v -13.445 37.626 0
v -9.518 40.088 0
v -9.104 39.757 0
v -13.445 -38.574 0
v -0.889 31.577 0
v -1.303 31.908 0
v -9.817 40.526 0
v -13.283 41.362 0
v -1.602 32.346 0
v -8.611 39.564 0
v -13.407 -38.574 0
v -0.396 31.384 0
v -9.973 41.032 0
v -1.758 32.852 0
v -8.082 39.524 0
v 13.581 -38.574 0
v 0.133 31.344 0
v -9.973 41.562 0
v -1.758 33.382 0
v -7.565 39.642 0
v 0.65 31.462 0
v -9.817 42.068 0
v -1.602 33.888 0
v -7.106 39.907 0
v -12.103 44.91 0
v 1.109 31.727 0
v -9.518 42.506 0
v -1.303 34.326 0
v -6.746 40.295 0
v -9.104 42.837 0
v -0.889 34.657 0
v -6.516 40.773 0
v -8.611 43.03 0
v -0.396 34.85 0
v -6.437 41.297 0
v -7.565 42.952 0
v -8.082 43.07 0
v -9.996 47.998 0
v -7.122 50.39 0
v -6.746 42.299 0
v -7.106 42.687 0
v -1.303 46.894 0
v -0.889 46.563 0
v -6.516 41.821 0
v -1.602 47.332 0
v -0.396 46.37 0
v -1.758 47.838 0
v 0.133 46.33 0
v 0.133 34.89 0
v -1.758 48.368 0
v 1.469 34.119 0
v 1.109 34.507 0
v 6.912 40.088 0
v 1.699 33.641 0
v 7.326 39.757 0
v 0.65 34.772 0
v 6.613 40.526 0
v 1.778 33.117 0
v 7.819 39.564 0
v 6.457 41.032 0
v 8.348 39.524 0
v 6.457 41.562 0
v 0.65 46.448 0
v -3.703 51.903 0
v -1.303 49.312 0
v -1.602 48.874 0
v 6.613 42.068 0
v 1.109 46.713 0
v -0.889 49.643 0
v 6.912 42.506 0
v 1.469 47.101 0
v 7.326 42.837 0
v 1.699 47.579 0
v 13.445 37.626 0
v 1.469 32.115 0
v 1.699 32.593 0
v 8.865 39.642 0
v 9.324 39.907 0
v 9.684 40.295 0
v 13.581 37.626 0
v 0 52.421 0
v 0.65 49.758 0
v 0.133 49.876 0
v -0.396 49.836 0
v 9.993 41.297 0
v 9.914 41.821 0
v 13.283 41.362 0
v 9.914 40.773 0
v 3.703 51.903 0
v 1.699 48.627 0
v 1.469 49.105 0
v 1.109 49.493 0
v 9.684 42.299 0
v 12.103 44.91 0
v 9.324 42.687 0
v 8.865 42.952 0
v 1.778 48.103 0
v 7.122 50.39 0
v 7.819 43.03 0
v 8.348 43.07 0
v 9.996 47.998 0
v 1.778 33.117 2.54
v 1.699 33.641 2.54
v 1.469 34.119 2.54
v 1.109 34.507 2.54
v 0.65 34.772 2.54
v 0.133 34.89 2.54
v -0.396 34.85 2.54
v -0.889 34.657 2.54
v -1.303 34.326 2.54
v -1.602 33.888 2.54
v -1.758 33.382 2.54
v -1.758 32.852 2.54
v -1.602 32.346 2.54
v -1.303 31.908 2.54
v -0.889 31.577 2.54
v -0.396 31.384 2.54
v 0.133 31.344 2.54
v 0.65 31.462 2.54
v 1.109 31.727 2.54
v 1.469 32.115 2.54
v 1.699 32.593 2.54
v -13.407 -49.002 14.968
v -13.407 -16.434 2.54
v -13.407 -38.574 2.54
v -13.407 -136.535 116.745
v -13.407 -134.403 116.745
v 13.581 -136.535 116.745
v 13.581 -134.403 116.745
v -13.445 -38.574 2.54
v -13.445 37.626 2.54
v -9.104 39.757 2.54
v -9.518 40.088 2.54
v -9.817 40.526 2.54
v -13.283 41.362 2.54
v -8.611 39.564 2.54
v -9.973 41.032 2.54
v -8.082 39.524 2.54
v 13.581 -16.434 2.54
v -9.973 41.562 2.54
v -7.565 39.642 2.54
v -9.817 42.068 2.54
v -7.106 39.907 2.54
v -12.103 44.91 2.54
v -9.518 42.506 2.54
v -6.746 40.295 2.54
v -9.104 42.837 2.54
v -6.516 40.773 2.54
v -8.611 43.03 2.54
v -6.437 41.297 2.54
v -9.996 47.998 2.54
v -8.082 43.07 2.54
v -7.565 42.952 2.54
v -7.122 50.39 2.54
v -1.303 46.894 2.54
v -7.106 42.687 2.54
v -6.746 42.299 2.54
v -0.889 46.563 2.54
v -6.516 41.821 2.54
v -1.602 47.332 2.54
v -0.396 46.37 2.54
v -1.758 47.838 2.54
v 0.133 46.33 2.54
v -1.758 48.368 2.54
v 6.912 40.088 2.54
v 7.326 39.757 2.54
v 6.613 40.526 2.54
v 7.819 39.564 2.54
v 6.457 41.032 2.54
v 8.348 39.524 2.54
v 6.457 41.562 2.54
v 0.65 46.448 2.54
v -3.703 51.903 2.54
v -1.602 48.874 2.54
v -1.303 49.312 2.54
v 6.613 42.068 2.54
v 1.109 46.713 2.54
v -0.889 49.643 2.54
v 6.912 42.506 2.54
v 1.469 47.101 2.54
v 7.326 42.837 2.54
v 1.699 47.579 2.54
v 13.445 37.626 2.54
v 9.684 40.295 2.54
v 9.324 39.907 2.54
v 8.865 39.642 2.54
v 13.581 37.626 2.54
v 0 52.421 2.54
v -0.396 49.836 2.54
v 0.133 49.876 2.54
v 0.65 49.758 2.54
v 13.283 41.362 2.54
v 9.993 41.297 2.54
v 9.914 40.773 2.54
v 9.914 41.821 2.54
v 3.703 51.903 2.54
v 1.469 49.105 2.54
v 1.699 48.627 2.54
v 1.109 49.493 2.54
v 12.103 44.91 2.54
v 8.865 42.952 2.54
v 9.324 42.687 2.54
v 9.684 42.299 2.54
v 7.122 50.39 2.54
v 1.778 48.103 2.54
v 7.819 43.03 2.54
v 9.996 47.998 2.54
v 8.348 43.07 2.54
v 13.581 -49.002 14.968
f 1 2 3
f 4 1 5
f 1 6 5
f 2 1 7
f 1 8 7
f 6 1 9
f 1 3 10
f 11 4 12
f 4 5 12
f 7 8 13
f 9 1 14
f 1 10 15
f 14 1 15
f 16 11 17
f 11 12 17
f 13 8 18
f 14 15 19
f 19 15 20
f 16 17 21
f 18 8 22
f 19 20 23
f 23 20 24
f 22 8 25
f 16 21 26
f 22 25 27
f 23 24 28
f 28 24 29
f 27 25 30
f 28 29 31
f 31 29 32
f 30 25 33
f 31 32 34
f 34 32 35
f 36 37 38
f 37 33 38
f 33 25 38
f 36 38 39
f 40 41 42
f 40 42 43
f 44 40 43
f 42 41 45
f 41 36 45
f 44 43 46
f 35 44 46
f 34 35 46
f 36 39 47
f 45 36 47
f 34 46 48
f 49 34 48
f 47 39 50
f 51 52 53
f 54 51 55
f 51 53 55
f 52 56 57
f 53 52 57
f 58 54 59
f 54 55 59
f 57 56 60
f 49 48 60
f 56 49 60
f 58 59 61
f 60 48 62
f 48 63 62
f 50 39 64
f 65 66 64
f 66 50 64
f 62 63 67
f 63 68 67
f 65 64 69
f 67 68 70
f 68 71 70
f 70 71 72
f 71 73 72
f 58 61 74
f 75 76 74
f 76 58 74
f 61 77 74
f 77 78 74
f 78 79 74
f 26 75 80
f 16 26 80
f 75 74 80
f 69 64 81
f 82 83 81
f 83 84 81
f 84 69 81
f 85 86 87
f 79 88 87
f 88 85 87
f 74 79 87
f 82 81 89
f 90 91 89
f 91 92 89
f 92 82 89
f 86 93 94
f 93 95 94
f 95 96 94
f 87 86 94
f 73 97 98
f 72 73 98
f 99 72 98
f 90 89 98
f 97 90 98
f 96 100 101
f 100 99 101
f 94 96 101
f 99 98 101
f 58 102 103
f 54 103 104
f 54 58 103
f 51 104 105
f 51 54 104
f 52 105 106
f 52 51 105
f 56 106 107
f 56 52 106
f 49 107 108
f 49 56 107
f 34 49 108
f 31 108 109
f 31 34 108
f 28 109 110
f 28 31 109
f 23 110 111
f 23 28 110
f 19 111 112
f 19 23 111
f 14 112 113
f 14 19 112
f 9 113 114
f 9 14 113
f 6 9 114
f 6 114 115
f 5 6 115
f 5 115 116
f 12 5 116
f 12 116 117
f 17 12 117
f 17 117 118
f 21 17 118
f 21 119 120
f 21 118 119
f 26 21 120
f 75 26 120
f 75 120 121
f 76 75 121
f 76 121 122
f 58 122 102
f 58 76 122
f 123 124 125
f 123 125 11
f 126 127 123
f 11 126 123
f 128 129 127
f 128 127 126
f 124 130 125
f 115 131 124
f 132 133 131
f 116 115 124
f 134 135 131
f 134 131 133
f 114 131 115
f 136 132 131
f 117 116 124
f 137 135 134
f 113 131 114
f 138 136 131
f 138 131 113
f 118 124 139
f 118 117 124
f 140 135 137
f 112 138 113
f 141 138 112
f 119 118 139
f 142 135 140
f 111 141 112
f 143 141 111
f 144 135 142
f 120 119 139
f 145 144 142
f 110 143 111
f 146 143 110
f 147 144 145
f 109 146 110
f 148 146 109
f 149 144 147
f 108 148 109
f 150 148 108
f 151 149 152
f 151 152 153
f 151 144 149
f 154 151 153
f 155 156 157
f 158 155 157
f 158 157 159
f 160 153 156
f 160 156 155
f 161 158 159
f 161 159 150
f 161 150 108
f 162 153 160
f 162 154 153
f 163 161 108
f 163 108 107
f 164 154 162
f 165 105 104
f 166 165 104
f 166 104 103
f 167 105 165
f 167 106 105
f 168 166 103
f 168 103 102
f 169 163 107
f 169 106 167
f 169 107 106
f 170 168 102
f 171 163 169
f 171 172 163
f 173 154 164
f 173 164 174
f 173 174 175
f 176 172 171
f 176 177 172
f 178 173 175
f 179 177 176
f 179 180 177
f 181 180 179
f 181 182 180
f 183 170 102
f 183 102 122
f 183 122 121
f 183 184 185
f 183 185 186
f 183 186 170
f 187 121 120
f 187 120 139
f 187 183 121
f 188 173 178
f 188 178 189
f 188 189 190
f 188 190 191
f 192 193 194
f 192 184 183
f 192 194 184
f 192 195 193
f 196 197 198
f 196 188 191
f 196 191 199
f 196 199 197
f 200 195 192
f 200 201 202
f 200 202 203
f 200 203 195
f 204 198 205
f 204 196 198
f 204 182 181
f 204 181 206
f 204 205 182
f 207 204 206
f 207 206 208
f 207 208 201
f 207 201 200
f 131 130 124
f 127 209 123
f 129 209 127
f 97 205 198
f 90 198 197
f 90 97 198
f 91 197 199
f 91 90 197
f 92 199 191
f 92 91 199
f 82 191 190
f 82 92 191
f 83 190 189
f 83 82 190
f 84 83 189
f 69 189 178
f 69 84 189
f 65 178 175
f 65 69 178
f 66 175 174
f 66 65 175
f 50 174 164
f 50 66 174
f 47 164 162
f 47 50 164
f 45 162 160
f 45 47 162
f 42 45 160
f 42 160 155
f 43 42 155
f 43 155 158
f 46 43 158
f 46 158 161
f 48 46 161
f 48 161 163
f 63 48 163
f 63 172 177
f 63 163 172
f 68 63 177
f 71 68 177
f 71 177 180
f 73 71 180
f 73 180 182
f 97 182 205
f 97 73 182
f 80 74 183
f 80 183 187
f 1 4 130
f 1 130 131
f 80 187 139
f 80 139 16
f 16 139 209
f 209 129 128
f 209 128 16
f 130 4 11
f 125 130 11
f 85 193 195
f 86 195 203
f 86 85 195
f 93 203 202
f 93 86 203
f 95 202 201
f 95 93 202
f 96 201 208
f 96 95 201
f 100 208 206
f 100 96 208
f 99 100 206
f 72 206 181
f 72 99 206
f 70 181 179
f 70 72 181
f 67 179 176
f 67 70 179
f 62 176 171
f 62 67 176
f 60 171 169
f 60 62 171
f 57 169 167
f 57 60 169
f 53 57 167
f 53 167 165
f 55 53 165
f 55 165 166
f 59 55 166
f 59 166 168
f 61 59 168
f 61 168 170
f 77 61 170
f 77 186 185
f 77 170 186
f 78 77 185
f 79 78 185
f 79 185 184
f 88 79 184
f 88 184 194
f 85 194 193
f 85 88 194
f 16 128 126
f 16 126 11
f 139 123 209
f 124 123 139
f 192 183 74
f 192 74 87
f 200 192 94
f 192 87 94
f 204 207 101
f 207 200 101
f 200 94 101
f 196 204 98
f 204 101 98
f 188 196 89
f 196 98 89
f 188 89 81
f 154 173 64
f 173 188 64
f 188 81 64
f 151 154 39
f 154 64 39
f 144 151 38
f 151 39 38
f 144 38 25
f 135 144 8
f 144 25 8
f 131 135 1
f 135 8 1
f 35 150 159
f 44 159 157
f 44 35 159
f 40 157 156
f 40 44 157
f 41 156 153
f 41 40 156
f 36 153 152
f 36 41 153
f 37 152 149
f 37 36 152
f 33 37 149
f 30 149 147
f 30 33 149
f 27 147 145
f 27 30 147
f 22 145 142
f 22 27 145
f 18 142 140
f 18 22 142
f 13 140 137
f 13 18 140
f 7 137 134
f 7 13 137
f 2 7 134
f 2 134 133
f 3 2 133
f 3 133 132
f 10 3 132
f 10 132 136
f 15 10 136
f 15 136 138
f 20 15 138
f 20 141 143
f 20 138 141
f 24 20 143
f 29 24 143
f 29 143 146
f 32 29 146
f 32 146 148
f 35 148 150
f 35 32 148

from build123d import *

# Parameters (mm, degrees)
F0_R      = 13.50645
F1_DEPTH  = 2.54
F2_W      = 27.0256
F2_H      = 76.2
F3_DEPTH  = 2.54
F4_R      = 1.778
F5_DEPTH  = 2.541
F7_DEPTH  = 26.9875
F9_DEPTH  = 26.9875
F10_R     = 60.96
F10_W     = 26.9875
F10_H     = 2.1313130632
F11_DEPTH = 50.8
F12_R     = 56.5455680067
F13_DEPTH = 116.7461731313
F15_DEPTH = 50.801
F17_DEPTH = 50.8
F19_DEPTH = 25.4
F20_DEPTH = 26.9875
F21_DEPTH = 25.4


# Not quite as in the source:
# - a feature names something its author has since deleted; it is built from what else it names


with BuildPart() as f1:
    # F0 (on Top) → F1 (new body)
    with BuildSketch(Plane.XY):
        with Locations((0, 38.9145108197)):
            Circle(F0_R)
    extrude(amount=F1_DEPTH)

    # F2 (on Top) → F3 (join)
    with BuildSketch(Plane.XY):
        with Locations((0.0679422232, -0.4738955459)):
            Rectangle(F2_W, F2_H)
    extrude(amount=F3_DEPTH)

    # F4 (on Top) → F5 (cut, through all)
    with BuildSketch(Plane.XY):
        with Locations((-8.2149387259, 41.2970071224)):
            Circle(F4_R)
        with Locations((0, 48.1029608197)):
            Circle(F4_R)
        with Locations((0, 33.1169608197)):
            Circle(F4_R)
        with Locations((8.2149387259, 41.2970071224)):
            Circle(F4_R)
    extrude(amount=F5_DEPTH, mode=Mode.SUBTRACT)

    # F6 (on face) → F7 (join)
    with BuildSketch(Plane.YZ.offset(13.5807422232)):
        Polygon((-136.5347272621, 116.7451731313), (-38.5738955459, 0), (-38.5738955459, 2.54), (-134.4034141989, 116.7451731313), align=None)
    extrude(amount=-F7_DEPTH)

    # F8 (on face) → F9 (join)
    with BuildSketch(Plane(origin=(-13.4067577768, 0, 0), x_dir=(0, -1, 0), z_dir=(-1, 0, 0))):
        Polygon((38.5738955459, 2.54), (49.0018958172, 14.9676067869), (16.4343814087, 2.54), align=None)
    extrude(amount=-F9_DEPTH)


with BuildPart() as f11:
    # F10 (on face) → F11 (new body)
    with BuildSketch(Plane.XY.offset(116.7451731313)):
        with Locations((0, -175.3809303045)):
            Circle(F10_R)
        with Locations((0.0869922232, -135.4690707305)):
            Rectangle(F10_W, F10_H, mode=Mode.SUBTRACT)
    extrude(amount=-F11_DEPTH)

    # F12 (on face) → F13 (cut, through all)
    with BuildSketch(Plane.XY.offset(116.7451731313)):
        with Locations((-8.7670916691, -175.4986345768)):
            Circle(F12_R)
    extrude(amount=-F13_DEPTH, mode=Mode.SUBTRACT)

    # F14 (on face) → F15 (cut, through all)
    with BuildSketch(Plane(origin=(0, 0, 65.9451731313), x_dir=(1, 0, 0), z_dir=(0, 0, -1))):
        with BuildLine():
            ThreePointArc((-34.6411562373, 125.2200701191), (-26.8424040995, 120.6487921939), (-18.4533903647, 117.2810681356))
            Line((-18.4533903647, 117.2810681356), (-18.4533903647, 119.7888788891))
            ThreePointArc((-18.4533903647, 119.7888788891), (-26.7534564605, 121.8899417854), (-34.6411562373, 125.2200701191))
        make_face()
    extrude(amount=-F15_DEPTH, mode=Mode.SUBTRACT)

    # F16 (on face) → F17 (cut)
    with BuildSketch(Plane(origin=(0, 0, 65.9451731313), x_dir=(1, 0, 0), z_dir=(0, 0, -1))):
        with BuildLine():
            Line((-12.9449410231, 231.889651911), (-12.9449410231, 234.9506382265))
            ThreePointArc((-12.9449410231, 234.9506382265), (-23.5006925786, 231.6289440324), (-33.2820246218, 226.4537061942))
            ThreePointArc((-33.2820246218, 226.4537061942), (-23.3686777331, 230.1264200492), (-12.9449410231, 231.889651911))
        make_face()
    extrude(amount=-F17_DEPTH, mode=Mode.SUBTRACT)


with BuildPart() as f19:
    # F18 (on face) → F19 (new body)
    with BuildSketch(Plane(origin=(-13.4067577768, 0, 0), x_dir=(0, -1, 0), z_dir=(-1, 0, 0))):
        Polygon((116.024311172, 92.3018110703), (105.3223571677, 79.5477189379), (117.2810681356, 79.5477189379), align=None)
    extrude(amount=F19_DEPTH)


with BuildPart() as f20:
    # F18 (on face) → F20 (new body)
    with BuildSketch(Plane(origin=(-13.4067577768, 0, 0), x_dir=(0, -1, 0), z_dir=(-1, 0, 0))):
        Polygon((116.024311172, 92.3018110703), (105.3223571677, 79.5477189379), (117.2810681356, 79.5477189379), align=None)
    extrude(amount=-F20_DEPTH)


with BuildPart() as f21_tool:
    # F21 (cut): a face of the model
    f21_faces = [f19.part.faces().sort_by_distance(p)[0] for p in [
        (-38.8067577768, -112.8759121584, 83.7990829821),
    ]]
    extrude(f21_faces, amount=-F21_DEPTH)


with BuildPart() as f11_1:
    add(f11.part)

    # F21: cut by f21_tool
    add(f21_tool.part, mode=Mode.SUBTRACT)


with BuildPart() as f19_1:
    add(f19.part)

    # F21: cut by f21_tool
    add(f21_tool.part, mode=Mode.SUBTRACT)


solid = f1.part
